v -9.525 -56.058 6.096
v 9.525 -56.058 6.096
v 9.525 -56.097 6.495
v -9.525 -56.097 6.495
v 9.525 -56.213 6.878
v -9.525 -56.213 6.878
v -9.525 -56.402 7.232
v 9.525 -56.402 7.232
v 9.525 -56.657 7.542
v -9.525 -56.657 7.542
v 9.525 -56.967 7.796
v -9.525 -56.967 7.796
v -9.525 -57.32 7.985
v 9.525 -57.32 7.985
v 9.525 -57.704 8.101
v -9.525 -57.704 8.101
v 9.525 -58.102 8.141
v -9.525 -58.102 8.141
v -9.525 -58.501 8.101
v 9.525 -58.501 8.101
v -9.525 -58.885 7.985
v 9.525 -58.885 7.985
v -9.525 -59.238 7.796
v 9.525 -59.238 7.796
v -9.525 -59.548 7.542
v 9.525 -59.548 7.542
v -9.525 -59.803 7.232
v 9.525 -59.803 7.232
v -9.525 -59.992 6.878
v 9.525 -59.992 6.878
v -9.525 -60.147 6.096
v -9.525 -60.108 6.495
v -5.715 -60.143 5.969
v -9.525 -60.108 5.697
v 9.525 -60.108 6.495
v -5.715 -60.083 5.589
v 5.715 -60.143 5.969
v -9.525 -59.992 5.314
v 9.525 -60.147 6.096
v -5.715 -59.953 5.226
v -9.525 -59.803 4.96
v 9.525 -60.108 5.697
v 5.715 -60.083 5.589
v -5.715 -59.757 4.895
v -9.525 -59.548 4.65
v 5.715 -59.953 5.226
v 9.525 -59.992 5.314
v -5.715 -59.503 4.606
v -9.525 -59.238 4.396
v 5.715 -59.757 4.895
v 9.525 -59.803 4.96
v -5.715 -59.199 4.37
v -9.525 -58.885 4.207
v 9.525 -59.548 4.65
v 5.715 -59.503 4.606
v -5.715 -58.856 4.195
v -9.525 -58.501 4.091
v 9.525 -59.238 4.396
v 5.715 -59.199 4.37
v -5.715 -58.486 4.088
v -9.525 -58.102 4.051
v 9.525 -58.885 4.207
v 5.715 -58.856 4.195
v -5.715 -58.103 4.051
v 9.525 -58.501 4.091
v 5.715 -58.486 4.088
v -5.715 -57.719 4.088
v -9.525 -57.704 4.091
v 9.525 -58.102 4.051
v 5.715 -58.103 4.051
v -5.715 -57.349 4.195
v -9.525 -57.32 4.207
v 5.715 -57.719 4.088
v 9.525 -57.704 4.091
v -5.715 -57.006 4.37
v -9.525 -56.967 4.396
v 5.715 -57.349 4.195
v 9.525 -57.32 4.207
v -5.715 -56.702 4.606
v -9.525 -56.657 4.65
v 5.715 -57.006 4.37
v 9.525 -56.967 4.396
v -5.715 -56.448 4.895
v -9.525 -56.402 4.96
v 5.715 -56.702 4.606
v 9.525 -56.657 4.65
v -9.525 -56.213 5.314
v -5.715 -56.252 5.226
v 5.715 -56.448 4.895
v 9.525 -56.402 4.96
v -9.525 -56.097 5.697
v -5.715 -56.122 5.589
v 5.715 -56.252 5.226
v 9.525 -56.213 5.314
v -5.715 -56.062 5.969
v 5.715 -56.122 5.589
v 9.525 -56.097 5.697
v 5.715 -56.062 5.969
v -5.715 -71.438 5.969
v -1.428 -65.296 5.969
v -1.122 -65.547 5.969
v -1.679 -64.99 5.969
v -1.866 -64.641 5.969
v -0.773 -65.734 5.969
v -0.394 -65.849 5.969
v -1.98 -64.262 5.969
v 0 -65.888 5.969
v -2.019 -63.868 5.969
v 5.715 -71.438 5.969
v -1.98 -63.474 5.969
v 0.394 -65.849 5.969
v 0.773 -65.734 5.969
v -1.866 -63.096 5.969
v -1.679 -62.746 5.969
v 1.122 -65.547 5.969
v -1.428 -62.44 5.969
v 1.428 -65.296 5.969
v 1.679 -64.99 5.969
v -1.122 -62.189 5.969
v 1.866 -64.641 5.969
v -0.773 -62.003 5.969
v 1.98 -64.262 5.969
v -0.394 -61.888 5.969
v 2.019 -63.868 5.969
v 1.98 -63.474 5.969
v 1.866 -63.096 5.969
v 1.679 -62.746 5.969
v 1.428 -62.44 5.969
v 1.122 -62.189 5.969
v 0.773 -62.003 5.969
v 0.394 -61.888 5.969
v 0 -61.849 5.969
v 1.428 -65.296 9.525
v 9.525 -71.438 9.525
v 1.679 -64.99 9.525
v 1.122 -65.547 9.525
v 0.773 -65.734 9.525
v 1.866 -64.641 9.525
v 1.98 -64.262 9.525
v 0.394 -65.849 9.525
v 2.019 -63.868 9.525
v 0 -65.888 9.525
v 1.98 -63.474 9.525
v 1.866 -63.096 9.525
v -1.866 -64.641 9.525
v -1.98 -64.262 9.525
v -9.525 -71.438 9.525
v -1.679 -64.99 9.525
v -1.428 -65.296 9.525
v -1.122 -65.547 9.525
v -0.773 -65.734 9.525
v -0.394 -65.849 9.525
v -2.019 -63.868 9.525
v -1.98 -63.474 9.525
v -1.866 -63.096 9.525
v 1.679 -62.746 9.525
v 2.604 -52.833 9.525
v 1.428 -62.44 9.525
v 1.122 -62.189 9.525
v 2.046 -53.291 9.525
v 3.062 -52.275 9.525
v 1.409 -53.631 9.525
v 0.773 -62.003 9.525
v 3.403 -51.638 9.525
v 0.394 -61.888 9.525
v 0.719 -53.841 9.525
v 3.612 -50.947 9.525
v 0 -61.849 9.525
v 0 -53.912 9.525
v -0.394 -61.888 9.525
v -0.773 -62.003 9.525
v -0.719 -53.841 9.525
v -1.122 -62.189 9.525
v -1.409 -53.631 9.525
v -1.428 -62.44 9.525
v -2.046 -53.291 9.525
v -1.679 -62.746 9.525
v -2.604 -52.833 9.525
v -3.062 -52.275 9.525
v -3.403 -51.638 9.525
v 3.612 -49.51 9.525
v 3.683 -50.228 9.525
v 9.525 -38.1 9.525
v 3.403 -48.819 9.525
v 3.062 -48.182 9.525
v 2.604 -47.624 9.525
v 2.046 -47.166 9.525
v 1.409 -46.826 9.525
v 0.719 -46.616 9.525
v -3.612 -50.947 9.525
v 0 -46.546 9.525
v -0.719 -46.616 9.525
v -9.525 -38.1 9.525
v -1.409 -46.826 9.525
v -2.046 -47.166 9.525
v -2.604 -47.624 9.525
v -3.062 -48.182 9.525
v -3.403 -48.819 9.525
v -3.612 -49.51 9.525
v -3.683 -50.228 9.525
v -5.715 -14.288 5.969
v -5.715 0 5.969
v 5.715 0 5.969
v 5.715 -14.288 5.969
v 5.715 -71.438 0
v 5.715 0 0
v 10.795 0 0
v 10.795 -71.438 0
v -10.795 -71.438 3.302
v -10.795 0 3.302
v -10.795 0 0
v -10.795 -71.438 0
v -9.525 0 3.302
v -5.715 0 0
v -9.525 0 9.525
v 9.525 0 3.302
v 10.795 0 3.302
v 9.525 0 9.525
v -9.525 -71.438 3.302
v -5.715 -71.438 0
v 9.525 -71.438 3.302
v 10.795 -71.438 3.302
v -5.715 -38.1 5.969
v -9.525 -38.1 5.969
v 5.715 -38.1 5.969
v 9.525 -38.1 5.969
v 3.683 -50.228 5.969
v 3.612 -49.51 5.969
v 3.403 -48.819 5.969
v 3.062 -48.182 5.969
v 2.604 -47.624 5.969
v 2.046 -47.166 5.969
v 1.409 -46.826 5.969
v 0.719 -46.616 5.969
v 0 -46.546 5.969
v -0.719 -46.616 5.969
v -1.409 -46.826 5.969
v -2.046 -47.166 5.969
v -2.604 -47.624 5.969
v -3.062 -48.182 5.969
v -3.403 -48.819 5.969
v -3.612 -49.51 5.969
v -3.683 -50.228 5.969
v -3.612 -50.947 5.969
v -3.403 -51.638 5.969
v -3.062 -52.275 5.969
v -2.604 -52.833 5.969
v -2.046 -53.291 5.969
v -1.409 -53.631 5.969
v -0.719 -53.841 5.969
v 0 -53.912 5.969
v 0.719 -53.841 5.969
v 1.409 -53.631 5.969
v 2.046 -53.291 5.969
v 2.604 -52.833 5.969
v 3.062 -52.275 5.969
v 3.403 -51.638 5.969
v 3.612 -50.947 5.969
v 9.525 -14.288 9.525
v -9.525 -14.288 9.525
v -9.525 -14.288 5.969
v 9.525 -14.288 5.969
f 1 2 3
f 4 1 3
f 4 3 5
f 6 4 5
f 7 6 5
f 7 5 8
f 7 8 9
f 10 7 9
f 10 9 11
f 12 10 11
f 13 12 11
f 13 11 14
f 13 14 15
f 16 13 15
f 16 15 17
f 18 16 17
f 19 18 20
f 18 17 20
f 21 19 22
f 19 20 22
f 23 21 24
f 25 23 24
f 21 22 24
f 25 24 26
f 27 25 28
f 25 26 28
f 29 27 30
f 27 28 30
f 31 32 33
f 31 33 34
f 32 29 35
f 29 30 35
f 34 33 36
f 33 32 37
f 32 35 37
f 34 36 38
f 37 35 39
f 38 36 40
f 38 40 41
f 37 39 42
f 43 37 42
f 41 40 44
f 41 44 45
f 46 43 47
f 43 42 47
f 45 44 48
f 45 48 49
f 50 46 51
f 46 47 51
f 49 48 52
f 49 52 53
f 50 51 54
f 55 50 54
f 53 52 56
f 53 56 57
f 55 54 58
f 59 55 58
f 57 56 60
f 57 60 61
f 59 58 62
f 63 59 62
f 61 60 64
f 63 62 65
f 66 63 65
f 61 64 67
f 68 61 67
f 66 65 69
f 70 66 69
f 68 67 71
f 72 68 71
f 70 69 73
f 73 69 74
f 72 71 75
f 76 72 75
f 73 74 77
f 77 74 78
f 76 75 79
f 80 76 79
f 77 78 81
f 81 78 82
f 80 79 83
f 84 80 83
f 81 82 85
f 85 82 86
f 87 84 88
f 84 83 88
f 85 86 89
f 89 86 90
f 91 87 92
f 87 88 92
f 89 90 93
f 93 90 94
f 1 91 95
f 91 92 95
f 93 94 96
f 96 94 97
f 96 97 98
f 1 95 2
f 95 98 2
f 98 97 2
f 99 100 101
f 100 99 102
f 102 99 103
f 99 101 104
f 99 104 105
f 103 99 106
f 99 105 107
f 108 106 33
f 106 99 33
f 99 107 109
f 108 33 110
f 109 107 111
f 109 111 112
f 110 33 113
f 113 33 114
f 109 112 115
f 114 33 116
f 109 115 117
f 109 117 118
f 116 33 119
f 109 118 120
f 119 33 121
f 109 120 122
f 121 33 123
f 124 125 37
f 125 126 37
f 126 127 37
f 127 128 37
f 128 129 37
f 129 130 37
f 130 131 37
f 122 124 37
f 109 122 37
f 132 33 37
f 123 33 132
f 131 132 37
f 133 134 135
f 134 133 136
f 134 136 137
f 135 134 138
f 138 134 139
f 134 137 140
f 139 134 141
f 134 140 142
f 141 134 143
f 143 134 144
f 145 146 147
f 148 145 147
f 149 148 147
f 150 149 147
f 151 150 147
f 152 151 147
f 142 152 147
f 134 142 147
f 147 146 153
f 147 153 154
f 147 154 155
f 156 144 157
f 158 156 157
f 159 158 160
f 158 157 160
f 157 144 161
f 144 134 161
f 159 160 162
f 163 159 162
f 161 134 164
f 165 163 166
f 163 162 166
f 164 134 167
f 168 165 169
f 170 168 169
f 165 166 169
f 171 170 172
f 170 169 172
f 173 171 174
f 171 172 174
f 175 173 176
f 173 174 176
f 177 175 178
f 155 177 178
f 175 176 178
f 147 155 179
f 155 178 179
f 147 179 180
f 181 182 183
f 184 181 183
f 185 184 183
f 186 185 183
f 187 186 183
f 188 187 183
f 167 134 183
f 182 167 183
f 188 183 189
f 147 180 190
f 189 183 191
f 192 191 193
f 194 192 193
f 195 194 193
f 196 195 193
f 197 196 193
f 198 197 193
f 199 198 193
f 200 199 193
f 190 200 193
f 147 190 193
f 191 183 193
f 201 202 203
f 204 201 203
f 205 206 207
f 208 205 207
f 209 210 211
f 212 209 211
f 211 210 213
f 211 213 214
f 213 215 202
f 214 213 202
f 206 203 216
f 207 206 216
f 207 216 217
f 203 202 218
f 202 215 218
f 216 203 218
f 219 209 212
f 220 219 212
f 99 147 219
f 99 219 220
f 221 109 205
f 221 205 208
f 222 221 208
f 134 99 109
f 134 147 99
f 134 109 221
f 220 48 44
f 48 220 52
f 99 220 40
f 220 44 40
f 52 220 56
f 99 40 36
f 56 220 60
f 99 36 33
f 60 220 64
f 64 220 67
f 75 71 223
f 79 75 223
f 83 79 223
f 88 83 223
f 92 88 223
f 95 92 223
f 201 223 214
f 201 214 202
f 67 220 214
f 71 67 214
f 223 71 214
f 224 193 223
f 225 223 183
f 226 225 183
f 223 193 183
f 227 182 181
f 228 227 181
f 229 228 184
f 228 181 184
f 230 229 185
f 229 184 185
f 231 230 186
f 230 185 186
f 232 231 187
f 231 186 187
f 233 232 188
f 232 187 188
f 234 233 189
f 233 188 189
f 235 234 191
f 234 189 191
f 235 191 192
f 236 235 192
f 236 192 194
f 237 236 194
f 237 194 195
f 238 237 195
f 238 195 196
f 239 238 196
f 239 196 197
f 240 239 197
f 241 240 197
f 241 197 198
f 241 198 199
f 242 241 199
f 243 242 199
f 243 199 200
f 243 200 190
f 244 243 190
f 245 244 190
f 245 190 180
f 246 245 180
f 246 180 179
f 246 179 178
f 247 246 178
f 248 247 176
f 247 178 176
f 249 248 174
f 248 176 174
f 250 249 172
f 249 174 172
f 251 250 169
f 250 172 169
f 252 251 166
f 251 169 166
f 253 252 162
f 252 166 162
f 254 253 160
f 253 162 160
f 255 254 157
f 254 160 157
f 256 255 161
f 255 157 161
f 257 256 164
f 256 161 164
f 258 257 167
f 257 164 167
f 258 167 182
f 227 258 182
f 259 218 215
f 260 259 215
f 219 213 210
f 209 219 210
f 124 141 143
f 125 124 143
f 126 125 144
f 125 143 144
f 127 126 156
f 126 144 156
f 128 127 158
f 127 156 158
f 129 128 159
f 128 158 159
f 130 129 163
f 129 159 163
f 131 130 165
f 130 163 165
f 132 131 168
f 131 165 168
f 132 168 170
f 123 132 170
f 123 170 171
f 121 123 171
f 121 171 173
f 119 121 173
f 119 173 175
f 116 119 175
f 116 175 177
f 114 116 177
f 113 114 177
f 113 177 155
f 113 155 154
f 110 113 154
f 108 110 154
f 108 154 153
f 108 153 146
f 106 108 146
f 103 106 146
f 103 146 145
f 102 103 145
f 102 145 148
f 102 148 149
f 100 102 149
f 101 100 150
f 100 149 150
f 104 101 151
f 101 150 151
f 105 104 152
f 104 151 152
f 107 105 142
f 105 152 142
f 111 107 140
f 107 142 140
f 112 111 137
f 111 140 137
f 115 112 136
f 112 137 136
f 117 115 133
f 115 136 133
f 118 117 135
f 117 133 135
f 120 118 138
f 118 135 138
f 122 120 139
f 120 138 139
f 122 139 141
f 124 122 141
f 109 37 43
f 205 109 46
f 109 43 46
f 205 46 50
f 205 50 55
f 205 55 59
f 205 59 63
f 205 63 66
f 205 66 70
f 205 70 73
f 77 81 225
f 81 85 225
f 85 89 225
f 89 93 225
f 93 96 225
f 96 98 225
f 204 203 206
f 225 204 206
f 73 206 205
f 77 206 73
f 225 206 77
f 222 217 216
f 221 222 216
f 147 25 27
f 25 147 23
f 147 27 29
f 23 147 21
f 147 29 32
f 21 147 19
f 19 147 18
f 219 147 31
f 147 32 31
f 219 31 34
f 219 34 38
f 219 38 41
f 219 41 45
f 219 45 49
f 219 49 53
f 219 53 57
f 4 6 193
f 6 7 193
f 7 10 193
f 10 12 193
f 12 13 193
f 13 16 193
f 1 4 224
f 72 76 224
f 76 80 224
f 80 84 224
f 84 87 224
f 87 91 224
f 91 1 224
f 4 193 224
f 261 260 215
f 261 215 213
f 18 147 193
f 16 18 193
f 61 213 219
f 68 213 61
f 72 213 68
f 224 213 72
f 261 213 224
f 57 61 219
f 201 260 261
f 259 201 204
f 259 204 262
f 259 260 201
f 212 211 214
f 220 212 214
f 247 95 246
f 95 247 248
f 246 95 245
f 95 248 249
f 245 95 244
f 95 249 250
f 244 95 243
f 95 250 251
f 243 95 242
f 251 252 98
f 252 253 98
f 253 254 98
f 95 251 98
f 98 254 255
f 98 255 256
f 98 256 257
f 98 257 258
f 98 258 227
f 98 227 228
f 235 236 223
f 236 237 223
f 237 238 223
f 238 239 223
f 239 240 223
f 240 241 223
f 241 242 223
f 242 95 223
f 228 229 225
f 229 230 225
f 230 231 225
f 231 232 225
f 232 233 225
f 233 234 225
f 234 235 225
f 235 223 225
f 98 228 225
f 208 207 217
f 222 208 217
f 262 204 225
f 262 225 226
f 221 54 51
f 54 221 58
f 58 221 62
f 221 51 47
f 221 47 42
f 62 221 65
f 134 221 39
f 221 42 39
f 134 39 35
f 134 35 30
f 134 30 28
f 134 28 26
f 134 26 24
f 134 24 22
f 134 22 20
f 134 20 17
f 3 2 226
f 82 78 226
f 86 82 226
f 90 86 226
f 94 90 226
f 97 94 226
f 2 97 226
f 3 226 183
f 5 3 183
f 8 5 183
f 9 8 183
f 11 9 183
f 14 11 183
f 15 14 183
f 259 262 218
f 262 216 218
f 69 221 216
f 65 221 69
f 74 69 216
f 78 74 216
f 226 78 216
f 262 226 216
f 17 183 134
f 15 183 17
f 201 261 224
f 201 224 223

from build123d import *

# Parameters (mm, degrees)
F1_DEPTH = 71.4375
F2_R     = 3.683
F2_R_2   = 2.0193
F3_DEPTH = 9.526
F4_R     = 2.0447
F5_DEPTH = 20.321
F6_W     = 19.05
F6_H     = 23.8125
F7_DEPTH = 3.556


with BuildPart() as f1:
    # F0 (on Front) → F1 (new body)
    with BuildSketch(Plane.XZ):
        Polygon((9.525, 9.525), (-9.525, 9.525), (-9.525, 3.302), (-10.795, 3.302), (-10.795, 0), (-5.715, 0), (-5.715, 5.969), (5.715, 5.969), (5.715, 0), (10.795, 0), (10.795, 3.302), (9.525, 3.302), align=None)
    extrude(amount=F1_DEPTH)

    # F2 (on face) → F3 (cut, through all)
    with BuildSketch(Plane.XY.offset(9.525)):
        with Locations((0, -50.2285)):
            Circle(F2_R)
        with Locations((0, -63.8683)):
            Circle(F2_R_2)
    extrude(amount=-F3_DEPTH, mode=Mode.SUBTRACT)

    # F4 (on face) → F5 (cut, through all)
    with BuildSketch(Plane.YZ.offset(9.525)):
        with Locations((-58.1025, 6.096)):
            Circle(F4_R)
    extrude(amount=-F5_DEPTH, mode=Mode.SUBTRACT)

    # F6 (on face) → F7 (cut)
    with BuildSketch(Plane.XY.offset(9.525)):
        with Locations((0, -26.19375)):
            Rectangle(F6_W, F6_H)
    extrude(amount=-F7_DEPTH, mode=Mode.SUBTRACT)


solid = f1.part
